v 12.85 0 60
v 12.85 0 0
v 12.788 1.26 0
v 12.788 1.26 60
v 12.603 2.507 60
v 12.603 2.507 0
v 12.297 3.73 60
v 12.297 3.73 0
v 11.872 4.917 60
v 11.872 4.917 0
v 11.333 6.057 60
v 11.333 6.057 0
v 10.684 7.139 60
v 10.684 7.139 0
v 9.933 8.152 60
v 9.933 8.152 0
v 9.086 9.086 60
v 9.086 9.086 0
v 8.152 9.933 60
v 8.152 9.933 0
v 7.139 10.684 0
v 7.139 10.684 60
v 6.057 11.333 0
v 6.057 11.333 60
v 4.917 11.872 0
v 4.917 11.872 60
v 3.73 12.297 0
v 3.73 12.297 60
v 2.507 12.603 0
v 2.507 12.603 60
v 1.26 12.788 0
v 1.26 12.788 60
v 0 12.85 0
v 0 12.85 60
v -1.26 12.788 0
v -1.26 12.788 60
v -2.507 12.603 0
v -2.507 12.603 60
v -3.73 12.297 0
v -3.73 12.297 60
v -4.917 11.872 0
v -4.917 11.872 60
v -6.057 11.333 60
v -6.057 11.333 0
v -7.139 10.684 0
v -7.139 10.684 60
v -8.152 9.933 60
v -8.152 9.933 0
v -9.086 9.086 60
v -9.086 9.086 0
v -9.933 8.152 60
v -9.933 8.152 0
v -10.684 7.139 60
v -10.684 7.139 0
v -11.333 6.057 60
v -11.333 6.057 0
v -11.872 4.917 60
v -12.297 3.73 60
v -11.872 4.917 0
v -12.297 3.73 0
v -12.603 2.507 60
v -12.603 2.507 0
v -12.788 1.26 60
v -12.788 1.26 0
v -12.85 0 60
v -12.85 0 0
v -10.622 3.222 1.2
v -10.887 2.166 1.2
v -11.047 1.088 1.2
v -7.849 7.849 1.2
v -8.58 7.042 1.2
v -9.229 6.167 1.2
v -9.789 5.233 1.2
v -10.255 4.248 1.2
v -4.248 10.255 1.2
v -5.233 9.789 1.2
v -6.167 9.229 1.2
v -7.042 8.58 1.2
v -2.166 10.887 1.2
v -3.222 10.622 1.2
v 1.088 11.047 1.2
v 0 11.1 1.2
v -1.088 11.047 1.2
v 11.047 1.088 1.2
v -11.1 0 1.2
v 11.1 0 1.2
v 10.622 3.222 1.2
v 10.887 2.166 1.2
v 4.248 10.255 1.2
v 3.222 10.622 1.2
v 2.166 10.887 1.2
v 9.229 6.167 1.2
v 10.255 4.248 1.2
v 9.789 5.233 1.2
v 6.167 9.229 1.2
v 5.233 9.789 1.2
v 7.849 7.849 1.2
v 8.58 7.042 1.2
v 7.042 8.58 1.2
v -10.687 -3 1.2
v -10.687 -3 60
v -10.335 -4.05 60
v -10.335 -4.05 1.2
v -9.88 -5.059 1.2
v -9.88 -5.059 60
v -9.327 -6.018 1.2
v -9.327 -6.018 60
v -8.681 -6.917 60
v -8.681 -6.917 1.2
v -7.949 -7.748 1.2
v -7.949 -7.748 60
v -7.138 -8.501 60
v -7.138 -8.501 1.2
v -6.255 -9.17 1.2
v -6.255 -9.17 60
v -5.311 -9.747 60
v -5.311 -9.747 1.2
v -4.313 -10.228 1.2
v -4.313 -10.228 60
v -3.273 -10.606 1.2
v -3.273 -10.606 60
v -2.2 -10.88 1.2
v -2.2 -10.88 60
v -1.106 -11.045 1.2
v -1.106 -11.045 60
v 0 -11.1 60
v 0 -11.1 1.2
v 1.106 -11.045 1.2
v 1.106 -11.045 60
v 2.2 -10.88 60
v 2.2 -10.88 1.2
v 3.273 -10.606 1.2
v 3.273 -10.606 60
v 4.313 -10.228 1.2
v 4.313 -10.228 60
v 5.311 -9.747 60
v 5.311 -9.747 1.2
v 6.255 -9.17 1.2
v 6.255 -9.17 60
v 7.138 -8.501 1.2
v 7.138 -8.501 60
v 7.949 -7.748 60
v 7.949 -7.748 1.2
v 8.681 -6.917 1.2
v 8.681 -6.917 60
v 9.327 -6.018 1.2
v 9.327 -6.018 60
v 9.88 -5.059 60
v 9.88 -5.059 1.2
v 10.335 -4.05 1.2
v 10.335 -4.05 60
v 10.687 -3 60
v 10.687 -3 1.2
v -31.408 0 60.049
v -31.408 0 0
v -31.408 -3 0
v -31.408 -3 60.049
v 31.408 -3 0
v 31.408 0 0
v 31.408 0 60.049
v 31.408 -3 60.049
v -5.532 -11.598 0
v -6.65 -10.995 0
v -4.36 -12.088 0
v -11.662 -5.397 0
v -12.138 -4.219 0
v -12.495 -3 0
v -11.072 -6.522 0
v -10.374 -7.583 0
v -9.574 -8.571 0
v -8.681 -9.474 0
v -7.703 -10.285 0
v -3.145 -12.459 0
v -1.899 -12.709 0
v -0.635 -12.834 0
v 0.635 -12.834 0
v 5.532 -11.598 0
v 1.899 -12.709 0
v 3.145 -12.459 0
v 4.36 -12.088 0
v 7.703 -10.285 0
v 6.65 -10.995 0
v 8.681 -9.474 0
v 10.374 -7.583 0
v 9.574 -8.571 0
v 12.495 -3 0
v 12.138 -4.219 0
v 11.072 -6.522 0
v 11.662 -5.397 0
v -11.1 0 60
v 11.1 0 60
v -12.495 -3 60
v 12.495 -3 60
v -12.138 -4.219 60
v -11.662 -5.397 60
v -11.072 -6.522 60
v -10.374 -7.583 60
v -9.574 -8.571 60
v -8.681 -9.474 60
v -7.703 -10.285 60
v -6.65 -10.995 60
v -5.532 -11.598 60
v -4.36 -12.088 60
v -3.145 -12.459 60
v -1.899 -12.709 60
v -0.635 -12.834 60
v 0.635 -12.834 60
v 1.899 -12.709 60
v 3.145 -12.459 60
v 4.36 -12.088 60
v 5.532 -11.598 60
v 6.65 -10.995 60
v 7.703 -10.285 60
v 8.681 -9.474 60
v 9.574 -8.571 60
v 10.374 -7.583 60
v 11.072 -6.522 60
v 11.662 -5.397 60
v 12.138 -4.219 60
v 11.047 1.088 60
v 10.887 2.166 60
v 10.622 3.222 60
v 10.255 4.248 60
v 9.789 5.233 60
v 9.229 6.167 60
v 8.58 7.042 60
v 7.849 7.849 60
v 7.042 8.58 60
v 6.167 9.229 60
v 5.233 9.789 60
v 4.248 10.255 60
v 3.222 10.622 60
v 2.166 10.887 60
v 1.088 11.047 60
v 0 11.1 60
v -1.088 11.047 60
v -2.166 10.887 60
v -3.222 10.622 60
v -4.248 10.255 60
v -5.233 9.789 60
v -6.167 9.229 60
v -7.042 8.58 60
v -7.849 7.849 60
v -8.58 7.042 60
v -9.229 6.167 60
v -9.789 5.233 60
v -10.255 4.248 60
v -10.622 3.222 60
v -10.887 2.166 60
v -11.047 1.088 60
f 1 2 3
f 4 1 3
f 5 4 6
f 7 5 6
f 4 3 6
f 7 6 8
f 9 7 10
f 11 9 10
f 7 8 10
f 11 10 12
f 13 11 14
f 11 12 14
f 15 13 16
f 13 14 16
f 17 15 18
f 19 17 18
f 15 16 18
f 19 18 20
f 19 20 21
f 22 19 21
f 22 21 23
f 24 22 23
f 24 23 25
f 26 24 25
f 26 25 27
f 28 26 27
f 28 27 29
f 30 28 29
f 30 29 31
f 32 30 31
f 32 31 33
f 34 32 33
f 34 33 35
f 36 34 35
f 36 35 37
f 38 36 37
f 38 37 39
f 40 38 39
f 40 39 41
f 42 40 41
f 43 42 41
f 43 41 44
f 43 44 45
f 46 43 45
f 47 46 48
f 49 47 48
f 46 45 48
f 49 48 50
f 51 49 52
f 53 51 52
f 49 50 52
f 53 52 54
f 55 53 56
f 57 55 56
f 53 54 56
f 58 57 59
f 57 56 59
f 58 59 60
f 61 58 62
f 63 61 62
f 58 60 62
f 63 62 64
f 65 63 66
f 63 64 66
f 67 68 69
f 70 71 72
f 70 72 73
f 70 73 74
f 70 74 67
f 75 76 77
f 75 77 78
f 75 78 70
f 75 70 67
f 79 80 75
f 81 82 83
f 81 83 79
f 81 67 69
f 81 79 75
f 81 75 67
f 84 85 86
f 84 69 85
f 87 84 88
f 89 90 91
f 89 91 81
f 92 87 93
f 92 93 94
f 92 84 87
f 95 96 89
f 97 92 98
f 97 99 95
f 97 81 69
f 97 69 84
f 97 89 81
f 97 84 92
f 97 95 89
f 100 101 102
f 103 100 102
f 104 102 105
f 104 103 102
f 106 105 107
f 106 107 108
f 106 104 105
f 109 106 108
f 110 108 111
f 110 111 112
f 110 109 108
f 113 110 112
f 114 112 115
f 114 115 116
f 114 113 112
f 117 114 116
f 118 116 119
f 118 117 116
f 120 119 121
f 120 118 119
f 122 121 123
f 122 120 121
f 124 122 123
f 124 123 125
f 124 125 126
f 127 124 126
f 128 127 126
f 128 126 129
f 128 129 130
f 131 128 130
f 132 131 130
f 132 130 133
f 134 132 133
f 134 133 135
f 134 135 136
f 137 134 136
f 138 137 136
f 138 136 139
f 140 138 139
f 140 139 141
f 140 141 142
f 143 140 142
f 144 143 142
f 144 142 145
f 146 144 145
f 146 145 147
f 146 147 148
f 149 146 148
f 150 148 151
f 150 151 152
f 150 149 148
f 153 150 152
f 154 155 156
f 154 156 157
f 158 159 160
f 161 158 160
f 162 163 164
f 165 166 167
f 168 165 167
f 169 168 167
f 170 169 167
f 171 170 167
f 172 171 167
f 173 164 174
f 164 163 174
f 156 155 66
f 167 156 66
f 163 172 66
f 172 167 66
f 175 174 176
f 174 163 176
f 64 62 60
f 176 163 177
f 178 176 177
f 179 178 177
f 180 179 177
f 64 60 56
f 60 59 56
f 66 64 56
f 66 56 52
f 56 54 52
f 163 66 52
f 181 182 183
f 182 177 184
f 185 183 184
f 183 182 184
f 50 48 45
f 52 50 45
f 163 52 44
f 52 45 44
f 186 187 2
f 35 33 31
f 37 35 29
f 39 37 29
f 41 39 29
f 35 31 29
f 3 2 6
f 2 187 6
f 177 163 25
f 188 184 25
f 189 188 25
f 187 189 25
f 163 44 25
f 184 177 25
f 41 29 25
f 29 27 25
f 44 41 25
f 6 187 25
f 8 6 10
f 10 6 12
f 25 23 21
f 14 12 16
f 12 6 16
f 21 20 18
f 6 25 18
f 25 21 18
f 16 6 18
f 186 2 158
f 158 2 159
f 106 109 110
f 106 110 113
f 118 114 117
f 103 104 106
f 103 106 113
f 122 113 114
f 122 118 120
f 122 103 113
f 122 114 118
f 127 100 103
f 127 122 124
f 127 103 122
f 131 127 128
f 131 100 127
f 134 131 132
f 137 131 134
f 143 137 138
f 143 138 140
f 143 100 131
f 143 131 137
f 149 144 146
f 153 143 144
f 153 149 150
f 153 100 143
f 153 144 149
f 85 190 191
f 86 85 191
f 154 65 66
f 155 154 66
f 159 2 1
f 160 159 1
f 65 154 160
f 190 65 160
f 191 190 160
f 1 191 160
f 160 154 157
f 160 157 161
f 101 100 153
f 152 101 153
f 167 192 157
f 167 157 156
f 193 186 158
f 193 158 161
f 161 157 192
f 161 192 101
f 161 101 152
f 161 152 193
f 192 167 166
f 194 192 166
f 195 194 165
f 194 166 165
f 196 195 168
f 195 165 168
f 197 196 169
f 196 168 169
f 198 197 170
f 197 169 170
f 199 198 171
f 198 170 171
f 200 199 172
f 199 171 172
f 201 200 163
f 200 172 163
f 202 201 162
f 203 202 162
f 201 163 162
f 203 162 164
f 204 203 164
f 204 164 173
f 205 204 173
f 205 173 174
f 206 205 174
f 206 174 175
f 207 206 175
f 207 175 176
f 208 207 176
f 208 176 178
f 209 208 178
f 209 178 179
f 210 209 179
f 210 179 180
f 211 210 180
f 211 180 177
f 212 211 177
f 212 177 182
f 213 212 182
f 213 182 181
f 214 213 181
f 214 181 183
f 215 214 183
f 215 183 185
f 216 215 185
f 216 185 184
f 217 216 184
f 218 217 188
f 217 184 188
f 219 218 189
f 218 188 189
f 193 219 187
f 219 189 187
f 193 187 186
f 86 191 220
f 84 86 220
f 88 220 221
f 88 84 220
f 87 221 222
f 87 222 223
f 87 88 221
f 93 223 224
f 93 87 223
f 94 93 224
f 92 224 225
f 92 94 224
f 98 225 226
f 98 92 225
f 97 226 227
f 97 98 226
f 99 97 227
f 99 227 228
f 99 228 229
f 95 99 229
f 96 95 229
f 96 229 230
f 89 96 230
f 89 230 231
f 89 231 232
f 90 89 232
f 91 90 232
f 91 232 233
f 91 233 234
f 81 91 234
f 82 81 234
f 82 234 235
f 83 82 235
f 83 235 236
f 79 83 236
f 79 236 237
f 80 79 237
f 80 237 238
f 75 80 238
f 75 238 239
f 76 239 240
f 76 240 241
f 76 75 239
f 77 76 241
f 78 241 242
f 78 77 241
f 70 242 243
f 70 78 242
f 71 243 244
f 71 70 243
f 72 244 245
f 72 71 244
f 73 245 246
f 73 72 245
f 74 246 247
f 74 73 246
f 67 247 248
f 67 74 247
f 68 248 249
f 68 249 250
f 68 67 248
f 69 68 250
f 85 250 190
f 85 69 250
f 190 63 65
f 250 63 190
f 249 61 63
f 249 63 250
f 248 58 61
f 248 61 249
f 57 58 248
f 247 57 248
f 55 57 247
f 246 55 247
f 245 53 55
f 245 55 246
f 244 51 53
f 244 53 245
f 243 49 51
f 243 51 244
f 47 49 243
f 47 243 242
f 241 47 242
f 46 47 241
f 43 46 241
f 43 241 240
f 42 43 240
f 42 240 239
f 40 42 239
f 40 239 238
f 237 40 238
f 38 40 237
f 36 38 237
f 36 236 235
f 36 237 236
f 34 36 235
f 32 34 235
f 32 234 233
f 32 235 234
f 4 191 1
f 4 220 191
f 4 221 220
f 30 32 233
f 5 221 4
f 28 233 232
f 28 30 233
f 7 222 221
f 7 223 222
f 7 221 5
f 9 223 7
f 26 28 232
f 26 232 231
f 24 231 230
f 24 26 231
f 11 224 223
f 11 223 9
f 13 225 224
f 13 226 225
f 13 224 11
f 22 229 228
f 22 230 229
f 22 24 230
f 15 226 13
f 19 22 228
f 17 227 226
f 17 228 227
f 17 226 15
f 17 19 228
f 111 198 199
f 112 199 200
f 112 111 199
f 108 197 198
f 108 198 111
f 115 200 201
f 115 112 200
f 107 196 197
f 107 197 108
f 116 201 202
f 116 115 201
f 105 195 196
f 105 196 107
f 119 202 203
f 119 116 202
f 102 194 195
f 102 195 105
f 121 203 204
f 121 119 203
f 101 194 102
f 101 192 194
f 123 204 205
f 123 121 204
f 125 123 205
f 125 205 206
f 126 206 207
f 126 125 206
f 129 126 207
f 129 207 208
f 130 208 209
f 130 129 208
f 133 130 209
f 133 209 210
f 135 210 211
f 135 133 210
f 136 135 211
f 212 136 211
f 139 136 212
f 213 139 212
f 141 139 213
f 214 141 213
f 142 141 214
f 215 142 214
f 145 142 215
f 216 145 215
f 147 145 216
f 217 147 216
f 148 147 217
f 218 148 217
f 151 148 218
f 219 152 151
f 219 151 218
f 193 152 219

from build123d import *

# Parameters (mm, degrees)
F0_R     = 11.1
F1_DEPTH = 1.2
F0_R_2   = 12.85
F2_DEPTH = 60
F3_W     = 62.815846
F3_H     = 60.049228
F4_DEPTH = 3


with BuildPart() as f1:
    # F0 (on Top) → F1 (new body)
    with BuildSketch(Plane.XY):
        Circle(F0_R)
    extrude(amount=F1_DEPTH)

    # F0 (on Top) → F2 (join)
    with BuildSketch(Plane.XY):
        Circle(F0_R_2)
        Circle(F0_R, mode=Mode.SUBTRACT)
    extrude(amount=F2_DEPTH)

    # F3 (on Front) → F4 (join)
    with BuildSketch(Plane.XZ):
        with Locations((0, 30.024614)):
            Rectangle(F3_W, F3_H)
    extrude(amount=F4_DEPTH)


solid = f1.part
